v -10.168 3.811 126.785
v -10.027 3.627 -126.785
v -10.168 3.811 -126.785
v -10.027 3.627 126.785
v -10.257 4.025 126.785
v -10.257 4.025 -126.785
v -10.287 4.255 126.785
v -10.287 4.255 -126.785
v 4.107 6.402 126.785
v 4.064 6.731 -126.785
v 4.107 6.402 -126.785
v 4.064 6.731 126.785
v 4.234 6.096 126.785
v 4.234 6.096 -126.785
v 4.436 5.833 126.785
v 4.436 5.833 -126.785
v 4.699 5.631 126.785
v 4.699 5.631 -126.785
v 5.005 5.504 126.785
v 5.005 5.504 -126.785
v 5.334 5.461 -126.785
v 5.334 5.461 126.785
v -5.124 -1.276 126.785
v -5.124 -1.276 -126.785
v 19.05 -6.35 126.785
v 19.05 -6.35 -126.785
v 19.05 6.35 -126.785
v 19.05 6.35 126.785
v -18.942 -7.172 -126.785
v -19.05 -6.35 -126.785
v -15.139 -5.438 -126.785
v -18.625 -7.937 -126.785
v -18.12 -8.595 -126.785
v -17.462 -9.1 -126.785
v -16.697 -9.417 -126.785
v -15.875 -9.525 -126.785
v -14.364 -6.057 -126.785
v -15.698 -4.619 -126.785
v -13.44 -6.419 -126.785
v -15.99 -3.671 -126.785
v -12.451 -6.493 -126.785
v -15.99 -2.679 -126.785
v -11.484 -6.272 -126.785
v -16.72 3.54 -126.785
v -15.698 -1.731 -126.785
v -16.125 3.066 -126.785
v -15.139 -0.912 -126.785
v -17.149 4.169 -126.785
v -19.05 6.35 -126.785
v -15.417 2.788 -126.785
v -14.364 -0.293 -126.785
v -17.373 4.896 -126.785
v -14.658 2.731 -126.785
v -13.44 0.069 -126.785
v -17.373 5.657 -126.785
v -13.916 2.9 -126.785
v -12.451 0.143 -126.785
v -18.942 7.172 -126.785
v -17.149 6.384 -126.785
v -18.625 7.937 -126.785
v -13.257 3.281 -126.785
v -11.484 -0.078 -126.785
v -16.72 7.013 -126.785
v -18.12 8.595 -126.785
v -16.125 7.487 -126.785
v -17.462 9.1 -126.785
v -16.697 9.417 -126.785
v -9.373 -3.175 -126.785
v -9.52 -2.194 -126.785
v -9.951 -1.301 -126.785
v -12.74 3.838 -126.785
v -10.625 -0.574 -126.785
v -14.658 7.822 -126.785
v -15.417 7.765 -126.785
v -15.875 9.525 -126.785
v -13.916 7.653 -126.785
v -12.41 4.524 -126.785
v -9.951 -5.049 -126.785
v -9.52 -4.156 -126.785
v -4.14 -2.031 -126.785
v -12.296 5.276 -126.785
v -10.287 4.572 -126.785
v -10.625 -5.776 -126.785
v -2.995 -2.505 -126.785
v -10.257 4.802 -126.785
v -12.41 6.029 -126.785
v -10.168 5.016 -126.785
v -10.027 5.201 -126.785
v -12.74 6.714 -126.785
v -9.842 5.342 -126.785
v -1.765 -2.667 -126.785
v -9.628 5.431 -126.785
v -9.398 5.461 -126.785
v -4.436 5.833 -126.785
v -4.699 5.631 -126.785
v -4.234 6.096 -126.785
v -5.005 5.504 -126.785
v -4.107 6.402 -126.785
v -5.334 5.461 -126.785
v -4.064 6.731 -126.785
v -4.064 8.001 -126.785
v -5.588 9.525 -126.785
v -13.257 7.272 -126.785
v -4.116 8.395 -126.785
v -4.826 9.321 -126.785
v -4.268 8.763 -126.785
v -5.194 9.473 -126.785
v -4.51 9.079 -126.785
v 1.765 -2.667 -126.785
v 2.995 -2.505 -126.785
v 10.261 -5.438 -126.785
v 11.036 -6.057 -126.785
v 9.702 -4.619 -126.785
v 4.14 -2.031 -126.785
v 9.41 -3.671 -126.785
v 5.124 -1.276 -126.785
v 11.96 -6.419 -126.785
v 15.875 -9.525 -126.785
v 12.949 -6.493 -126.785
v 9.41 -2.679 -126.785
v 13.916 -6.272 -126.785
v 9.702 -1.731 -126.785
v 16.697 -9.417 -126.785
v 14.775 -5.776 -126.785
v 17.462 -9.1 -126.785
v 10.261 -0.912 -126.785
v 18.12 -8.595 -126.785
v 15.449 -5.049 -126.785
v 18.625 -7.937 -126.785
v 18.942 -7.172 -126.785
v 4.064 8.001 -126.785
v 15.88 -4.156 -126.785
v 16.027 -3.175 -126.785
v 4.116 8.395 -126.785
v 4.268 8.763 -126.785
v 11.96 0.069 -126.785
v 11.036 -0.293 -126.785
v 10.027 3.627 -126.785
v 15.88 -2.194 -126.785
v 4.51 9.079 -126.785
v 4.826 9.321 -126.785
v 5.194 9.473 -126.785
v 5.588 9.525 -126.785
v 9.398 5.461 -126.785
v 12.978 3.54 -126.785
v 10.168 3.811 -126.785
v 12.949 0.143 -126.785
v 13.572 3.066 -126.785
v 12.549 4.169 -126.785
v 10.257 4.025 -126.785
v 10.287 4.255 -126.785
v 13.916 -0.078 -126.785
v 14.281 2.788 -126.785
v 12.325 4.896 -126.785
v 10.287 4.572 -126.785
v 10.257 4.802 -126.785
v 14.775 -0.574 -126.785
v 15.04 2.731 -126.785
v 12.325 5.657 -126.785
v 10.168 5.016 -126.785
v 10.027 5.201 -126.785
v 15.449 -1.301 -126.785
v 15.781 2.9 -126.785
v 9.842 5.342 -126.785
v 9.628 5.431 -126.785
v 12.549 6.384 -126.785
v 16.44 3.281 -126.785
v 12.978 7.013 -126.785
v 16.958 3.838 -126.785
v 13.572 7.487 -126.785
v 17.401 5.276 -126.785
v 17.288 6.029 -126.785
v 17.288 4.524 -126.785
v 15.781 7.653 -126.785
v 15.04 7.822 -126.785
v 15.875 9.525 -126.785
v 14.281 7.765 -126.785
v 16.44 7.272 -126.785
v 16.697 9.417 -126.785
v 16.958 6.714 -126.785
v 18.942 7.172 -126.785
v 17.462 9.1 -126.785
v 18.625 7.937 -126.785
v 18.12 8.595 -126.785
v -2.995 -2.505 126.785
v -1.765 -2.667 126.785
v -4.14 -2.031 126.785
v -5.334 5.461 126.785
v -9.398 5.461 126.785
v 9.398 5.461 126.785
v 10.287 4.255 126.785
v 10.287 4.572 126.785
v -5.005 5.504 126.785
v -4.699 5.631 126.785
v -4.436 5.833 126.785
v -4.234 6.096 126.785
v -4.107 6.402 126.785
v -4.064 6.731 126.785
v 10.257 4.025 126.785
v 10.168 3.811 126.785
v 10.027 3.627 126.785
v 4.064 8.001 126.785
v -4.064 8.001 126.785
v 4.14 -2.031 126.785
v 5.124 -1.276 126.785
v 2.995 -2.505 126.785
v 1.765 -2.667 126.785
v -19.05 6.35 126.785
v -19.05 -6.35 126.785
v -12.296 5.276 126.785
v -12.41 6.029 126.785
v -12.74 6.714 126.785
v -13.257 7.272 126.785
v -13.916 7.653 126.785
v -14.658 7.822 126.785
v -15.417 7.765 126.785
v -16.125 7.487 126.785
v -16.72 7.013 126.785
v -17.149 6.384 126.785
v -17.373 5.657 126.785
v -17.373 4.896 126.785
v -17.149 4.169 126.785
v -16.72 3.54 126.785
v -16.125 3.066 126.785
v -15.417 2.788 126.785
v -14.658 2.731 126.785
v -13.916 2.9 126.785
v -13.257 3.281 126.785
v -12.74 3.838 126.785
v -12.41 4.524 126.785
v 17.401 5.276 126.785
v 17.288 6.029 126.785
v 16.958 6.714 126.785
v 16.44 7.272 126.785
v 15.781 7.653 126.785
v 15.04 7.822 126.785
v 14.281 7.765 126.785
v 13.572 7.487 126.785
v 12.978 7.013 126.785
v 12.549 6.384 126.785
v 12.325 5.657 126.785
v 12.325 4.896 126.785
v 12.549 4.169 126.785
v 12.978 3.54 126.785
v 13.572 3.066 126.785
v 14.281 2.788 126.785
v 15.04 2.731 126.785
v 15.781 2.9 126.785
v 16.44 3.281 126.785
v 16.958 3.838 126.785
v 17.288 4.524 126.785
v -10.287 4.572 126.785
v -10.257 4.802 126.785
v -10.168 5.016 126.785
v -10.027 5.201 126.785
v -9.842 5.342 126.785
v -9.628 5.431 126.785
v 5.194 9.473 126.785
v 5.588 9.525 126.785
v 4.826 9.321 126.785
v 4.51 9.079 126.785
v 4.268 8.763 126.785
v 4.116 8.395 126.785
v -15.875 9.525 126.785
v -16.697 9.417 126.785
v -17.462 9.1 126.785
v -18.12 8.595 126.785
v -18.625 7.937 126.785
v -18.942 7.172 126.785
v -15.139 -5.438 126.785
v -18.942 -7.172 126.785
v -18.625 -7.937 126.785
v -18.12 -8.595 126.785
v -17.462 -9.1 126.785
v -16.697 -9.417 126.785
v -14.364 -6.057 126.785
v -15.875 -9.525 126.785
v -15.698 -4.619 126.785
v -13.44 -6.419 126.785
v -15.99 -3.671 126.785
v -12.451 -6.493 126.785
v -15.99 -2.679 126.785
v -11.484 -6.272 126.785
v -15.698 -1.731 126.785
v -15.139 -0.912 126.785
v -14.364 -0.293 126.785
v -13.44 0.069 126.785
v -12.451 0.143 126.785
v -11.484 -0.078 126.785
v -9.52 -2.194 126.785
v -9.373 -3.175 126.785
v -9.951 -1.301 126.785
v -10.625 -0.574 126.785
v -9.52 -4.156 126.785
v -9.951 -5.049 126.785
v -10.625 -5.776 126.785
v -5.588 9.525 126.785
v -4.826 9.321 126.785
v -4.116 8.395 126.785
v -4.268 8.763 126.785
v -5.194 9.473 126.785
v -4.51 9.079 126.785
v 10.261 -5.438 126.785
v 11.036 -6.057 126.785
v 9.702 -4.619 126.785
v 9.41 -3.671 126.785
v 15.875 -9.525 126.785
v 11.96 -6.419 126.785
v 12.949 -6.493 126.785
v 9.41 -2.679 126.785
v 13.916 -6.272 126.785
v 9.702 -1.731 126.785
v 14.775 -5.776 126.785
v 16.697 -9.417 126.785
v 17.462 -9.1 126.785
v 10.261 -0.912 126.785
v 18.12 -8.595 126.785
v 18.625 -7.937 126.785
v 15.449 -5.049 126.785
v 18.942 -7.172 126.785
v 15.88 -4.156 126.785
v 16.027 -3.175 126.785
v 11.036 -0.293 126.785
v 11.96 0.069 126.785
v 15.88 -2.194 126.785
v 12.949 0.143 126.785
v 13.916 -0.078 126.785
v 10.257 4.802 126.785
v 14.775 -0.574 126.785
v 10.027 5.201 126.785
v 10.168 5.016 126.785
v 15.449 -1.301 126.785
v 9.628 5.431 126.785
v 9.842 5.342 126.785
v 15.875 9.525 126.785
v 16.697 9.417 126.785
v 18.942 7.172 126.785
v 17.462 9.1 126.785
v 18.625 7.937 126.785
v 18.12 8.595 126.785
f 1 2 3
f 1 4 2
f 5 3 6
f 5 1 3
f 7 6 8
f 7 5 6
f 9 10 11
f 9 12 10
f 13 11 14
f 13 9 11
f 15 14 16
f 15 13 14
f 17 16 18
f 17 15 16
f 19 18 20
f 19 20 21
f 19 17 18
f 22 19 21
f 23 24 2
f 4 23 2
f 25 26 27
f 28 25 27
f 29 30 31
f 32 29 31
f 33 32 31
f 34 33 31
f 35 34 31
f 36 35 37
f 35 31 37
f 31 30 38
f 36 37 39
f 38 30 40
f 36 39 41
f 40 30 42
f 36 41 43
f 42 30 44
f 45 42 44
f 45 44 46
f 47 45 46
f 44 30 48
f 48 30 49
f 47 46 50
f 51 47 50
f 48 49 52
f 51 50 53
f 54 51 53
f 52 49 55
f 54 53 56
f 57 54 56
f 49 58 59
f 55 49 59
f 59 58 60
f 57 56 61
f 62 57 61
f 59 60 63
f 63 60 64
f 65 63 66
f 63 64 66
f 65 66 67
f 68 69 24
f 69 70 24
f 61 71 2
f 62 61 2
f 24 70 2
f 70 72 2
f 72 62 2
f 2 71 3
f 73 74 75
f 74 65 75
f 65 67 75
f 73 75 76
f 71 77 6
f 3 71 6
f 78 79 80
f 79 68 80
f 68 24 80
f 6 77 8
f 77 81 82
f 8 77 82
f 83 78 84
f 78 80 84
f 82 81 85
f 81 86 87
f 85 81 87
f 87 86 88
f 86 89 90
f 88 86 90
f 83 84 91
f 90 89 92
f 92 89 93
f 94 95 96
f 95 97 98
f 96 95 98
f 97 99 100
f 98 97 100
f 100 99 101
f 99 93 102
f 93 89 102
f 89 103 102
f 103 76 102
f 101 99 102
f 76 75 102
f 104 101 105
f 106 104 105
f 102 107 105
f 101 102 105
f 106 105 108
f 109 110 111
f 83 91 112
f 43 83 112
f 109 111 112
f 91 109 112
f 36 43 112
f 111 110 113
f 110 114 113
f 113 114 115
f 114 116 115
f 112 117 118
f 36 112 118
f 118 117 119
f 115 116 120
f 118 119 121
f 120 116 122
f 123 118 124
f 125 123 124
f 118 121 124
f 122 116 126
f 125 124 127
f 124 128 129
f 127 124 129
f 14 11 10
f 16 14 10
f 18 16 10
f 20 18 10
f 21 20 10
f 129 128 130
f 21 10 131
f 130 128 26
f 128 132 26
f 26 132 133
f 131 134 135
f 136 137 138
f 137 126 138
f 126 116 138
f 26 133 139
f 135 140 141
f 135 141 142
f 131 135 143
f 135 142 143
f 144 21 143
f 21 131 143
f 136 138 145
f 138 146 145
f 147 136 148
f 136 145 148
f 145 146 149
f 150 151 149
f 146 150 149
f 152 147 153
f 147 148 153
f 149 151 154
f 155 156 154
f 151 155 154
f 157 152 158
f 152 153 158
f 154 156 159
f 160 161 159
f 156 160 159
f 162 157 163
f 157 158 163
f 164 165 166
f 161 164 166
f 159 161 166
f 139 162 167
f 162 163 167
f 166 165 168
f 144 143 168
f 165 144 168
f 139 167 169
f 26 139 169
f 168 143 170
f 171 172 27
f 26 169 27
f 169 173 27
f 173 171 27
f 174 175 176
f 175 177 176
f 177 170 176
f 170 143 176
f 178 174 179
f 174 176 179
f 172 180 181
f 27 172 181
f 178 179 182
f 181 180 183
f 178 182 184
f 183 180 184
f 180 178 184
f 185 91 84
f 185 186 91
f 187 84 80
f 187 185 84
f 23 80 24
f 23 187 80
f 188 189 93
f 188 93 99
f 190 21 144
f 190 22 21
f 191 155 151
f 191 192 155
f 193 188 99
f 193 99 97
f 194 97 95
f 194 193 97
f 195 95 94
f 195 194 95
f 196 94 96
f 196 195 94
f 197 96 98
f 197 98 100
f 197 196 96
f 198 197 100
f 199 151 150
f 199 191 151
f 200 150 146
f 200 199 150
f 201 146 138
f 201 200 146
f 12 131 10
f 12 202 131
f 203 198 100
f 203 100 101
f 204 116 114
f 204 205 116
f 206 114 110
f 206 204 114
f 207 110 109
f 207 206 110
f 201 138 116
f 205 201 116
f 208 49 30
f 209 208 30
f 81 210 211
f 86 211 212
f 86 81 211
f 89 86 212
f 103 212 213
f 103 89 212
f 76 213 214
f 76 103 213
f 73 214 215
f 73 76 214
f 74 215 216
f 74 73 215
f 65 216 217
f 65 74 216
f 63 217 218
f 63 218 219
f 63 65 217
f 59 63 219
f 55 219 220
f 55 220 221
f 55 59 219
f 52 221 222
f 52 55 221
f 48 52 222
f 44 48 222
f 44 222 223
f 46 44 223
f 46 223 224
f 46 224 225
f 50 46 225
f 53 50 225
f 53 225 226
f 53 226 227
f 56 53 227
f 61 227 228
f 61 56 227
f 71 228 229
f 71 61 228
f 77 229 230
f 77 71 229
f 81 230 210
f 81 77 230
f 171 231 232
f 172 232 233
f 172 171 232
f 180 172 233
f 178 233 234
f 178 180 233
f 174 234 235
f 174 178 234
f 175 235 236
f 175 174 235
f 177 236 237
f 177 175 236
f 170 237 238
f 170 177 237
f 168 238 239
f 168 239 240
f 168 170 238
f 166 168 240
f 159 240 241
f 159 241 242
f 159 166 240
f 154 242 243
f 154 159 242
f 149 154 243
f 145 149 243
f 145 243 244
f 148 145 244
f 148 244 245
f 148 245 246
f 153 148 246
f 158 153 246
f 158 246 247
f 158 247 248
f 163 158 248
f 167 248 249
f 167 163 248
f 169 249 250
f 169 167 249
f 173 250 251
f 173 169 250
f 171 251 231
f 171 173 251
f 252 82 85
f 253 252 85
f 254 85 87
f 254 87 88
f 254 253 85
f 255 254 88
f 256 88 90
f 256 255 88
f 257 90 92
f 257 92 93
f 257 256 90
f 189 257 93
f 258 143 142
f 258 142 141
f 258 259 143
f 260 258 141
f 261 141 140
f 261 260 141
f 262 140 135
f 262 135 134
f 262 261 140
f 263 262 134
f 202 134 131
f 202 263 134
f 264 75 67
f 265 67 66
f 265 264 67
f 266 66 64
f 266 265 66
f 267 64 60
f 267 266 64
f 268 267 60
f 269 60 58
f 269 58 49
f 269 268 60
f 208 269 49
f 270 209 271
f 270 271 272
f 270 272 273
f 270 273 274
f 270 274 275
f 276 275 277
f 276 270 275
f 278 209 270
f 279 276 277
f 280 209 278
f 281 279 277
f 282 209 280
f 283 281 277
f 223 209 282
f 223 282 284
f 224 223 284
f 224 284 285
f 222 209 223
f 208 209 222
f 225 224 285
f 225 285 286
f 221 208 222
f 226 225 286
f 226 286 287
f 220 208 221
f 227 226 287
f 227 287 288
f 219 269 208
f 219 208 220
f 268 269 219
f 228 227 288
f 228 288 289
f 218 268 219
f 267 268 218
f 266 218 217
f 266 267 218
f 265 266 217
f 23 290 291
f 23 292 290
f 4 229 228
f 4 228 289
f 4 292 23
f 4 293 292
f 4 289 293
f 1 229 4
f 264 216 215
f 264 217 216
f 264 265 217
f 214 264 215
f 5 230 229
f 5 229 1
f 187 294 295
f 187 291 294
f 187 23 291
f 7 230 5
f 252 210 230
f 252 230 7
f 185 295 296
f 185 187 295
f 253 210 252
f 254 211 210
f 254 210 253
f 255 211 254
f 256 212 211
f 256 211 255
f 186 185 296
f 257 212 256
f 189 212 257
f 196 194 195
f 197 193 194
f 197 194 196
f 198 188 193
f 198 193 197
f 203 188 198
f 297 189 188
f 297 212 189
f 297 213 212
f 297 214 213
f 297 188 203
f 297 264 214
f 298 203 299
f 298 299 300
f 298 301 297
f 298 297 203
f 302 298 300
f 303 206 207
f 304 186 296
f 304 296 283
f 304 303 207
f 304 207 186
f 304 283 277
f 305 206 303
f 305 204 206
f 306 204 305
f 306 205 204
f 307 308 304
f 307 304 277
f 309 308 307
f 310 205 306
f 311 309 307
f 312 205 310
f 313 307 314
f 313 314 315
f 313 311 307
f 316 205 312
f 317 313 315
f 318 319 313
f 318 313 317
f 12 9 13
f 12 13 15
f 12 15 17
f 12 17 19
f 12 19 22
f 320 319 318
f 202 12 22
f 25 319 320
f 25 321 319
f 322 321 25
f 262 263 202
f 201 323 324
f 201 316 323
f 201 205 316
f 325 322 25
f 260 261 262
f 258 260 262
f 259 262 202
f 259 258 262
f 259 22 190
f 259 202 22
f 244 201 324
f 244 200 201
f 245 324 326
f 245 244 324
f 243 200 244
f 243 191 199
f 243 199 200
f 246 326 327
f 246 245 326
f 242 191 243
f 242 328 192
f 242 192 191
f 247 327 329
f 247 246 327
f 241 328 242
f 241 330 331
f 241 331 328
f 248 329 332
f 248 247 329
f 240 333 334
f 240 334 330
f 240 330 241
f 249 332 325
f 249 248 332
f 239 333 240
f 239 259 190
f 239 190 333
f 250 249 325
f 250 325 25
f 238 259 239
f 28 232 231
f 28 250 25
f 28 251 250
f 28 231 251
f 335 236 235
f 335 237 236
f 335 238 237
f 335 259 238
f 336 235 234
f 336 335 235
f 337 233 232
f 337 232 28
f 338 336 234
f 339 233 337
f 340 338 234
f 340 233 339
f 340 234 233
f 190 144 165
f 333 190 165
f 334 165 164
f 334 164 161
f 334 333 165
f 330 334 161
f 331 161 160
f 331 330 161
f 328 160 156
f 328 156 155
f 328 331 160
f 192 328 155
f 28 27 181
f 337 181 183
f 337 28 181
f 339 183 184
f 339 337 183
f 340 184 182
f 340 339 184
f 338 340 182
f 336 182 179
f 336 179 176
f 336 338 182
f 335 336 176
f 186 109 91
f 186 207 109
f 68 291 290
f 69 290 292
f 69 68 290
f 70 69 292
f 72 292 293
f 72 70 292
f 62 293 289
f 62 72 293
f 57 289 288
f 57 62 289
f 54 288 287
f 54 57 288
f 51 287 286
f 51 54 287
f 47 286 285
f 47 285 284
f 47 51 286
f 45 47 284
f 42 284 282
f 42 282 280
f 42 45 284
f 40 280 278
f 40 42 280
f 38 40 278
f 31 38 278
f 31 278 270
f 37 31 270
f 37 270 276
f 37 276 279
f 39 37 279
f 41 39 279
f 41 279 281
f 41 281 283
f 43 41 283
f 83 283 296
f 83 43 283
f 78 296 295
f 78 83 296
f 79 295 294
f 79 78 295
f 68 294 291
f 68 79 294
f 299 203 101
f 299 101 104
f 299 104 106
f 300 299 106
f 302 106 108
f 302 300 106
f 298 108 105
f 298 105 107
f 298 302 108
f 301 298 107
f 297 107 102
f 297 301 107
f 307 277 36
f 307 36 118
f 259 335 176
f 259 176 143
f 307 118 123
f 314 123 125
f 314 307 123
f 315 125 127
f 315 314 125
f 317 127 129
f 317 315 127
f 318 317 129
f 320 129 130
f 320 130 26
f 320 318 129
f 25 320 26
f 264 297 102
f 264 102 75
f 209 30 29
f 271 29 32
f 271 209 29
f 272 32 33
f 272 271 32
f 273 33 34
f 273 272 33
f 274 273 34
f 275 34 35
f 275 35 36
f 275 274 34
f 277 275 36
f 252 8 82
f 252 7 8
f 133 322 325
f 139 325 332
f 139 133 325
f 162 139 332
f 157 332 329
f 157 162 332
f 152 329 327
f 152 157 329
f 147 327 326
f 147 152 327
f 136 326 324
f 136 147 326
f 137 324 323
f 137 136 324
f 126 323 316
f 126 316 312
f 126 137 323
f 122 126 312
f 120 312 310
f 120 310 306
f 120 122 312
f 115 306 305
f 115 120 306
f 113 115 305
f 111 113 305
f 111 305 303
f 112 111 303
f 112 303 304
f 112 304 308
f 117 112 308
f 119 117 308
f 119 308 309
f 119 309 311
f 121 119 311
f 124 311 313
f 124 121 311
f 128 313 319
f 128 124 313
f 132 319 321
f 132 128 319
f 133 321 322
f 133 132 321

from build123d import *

# Parameters (mm, degrees)
SKETCH2_R           = 2.5527
SKETCH2_R_2         = 3.3274
BOSS_EXTRUDE1_DEPTH = 126.785


with BuildPart() as part:
    # Sketch2 → Boss-Extrude1 (new, symmetric)
    with BuildSketch(Plane.XY):
        with BuildLine():
            Line((-10.287, 4.255364987), (-10.287, 4.572))
            ThreePointArc((-10.287, 4.572), (-10.026617928, 5.200617928), (-9.398, 5.461))
            Line((-9.398, 5.461), (-5.334, 5.461))
            ThreePointArc((-5.334, 5.461), (-4.435974388, 5.832974388), (-4.064, 6.731))
            Line((-4.064, 6.731), (-4.064, 8.001))
            ThreePointArc((-4.064, 8.001), (-4.510369265, 9.078630735), (-5.588, 9.525))
            Line((-5.588, 9.525), (-15.875, 9.525))
            ThreePointArc((-15.875, 9.525), (-18.12006403, 8.59506403), (-19.05, 6.35))
            Line((-19.05, 6.35), (-19.05, -6.35))
            ThreePointArc((-19.05, -6.35), (-18.12006403, -8.59506403), (-15.875, -9.525))
            Line((-15.875, -9.525), (15.875, -9.525))
            ThreePointArc((15.875, -9.525), (18.12006403, -8.59506403), (19.05, -6.35))
            Line((19.05, -6.35), (19.05, 6.35))
            ThreePointArc((19.05, 6.35), (18.12006403, 8.59506403), (15.875, 9.525))
            Line((15.875, 9.525), (5.588, 9.525))
            ThreePointArc((5.588, 9.525), (4.510369265, 9.078630735), (4.064, 8.001))
            Line((4.064, 8.001), (4.064, 6.731))
            ThreePointArc((4.064, 6.731), (4.435974388, 5.832974388), (5.334, 5.461))
            Line((5.334, 5.461), (9.398, 5.461))
            ThreePointArc((9.398, 5.461), (10.026617928, 5.200617928), (10.287, 4.572))
            Line((10.287, 4.572), (10.287, 4.255364987))
            ThreePointArc((10.287, 4.255364987), (10.219328904, 3.915159416), (10.026617928, 3.626747059))
            Line((10.026617928, 3.626747059), (5.124055081, -1.275815789))
            ThreePointArc((5.124055081, -1.275815789), (3.583109058, -2.305443004), (1.765439291, -2.667))
            Line((1.765439291, -2.667), (-1.765439291, -2.667))
            ThreePointArc((-1.765439291, -2.667), (-3.583109058, -2.305443004), (-5.124055081, -1.275815789))
            Line((-5.124055081, -1.275815789), (-10.026617928, 3.626747059))
            ThreePointArc((-10.026617928, 3.626747059), (-10.219328904, 3.915159416), (-10.287, 4.255364987))
        make_face()
        with Locations((-14.848796959, 5.276432773)):
            Circle(SKETCH2_R, mode=Mode.SUBTRACT)
        with Locations((-12.7, -3.175)):
            Circle(SKETCH2_R_2, mode=Mode.SUBTRACT)
        with Locations((12.7, -3.175)):
            Circle(SKETCH2_R_2, mode=Mode.SUBTRACT)
        with Locations((14.848796959, 5.276432773)):
            Circle(SKETCH2_R, mode=Mode.SUBTRACT)
    extrude(amount=BOSS_EXTRUDE1_DEPTH, both=True)


solid = part.part
